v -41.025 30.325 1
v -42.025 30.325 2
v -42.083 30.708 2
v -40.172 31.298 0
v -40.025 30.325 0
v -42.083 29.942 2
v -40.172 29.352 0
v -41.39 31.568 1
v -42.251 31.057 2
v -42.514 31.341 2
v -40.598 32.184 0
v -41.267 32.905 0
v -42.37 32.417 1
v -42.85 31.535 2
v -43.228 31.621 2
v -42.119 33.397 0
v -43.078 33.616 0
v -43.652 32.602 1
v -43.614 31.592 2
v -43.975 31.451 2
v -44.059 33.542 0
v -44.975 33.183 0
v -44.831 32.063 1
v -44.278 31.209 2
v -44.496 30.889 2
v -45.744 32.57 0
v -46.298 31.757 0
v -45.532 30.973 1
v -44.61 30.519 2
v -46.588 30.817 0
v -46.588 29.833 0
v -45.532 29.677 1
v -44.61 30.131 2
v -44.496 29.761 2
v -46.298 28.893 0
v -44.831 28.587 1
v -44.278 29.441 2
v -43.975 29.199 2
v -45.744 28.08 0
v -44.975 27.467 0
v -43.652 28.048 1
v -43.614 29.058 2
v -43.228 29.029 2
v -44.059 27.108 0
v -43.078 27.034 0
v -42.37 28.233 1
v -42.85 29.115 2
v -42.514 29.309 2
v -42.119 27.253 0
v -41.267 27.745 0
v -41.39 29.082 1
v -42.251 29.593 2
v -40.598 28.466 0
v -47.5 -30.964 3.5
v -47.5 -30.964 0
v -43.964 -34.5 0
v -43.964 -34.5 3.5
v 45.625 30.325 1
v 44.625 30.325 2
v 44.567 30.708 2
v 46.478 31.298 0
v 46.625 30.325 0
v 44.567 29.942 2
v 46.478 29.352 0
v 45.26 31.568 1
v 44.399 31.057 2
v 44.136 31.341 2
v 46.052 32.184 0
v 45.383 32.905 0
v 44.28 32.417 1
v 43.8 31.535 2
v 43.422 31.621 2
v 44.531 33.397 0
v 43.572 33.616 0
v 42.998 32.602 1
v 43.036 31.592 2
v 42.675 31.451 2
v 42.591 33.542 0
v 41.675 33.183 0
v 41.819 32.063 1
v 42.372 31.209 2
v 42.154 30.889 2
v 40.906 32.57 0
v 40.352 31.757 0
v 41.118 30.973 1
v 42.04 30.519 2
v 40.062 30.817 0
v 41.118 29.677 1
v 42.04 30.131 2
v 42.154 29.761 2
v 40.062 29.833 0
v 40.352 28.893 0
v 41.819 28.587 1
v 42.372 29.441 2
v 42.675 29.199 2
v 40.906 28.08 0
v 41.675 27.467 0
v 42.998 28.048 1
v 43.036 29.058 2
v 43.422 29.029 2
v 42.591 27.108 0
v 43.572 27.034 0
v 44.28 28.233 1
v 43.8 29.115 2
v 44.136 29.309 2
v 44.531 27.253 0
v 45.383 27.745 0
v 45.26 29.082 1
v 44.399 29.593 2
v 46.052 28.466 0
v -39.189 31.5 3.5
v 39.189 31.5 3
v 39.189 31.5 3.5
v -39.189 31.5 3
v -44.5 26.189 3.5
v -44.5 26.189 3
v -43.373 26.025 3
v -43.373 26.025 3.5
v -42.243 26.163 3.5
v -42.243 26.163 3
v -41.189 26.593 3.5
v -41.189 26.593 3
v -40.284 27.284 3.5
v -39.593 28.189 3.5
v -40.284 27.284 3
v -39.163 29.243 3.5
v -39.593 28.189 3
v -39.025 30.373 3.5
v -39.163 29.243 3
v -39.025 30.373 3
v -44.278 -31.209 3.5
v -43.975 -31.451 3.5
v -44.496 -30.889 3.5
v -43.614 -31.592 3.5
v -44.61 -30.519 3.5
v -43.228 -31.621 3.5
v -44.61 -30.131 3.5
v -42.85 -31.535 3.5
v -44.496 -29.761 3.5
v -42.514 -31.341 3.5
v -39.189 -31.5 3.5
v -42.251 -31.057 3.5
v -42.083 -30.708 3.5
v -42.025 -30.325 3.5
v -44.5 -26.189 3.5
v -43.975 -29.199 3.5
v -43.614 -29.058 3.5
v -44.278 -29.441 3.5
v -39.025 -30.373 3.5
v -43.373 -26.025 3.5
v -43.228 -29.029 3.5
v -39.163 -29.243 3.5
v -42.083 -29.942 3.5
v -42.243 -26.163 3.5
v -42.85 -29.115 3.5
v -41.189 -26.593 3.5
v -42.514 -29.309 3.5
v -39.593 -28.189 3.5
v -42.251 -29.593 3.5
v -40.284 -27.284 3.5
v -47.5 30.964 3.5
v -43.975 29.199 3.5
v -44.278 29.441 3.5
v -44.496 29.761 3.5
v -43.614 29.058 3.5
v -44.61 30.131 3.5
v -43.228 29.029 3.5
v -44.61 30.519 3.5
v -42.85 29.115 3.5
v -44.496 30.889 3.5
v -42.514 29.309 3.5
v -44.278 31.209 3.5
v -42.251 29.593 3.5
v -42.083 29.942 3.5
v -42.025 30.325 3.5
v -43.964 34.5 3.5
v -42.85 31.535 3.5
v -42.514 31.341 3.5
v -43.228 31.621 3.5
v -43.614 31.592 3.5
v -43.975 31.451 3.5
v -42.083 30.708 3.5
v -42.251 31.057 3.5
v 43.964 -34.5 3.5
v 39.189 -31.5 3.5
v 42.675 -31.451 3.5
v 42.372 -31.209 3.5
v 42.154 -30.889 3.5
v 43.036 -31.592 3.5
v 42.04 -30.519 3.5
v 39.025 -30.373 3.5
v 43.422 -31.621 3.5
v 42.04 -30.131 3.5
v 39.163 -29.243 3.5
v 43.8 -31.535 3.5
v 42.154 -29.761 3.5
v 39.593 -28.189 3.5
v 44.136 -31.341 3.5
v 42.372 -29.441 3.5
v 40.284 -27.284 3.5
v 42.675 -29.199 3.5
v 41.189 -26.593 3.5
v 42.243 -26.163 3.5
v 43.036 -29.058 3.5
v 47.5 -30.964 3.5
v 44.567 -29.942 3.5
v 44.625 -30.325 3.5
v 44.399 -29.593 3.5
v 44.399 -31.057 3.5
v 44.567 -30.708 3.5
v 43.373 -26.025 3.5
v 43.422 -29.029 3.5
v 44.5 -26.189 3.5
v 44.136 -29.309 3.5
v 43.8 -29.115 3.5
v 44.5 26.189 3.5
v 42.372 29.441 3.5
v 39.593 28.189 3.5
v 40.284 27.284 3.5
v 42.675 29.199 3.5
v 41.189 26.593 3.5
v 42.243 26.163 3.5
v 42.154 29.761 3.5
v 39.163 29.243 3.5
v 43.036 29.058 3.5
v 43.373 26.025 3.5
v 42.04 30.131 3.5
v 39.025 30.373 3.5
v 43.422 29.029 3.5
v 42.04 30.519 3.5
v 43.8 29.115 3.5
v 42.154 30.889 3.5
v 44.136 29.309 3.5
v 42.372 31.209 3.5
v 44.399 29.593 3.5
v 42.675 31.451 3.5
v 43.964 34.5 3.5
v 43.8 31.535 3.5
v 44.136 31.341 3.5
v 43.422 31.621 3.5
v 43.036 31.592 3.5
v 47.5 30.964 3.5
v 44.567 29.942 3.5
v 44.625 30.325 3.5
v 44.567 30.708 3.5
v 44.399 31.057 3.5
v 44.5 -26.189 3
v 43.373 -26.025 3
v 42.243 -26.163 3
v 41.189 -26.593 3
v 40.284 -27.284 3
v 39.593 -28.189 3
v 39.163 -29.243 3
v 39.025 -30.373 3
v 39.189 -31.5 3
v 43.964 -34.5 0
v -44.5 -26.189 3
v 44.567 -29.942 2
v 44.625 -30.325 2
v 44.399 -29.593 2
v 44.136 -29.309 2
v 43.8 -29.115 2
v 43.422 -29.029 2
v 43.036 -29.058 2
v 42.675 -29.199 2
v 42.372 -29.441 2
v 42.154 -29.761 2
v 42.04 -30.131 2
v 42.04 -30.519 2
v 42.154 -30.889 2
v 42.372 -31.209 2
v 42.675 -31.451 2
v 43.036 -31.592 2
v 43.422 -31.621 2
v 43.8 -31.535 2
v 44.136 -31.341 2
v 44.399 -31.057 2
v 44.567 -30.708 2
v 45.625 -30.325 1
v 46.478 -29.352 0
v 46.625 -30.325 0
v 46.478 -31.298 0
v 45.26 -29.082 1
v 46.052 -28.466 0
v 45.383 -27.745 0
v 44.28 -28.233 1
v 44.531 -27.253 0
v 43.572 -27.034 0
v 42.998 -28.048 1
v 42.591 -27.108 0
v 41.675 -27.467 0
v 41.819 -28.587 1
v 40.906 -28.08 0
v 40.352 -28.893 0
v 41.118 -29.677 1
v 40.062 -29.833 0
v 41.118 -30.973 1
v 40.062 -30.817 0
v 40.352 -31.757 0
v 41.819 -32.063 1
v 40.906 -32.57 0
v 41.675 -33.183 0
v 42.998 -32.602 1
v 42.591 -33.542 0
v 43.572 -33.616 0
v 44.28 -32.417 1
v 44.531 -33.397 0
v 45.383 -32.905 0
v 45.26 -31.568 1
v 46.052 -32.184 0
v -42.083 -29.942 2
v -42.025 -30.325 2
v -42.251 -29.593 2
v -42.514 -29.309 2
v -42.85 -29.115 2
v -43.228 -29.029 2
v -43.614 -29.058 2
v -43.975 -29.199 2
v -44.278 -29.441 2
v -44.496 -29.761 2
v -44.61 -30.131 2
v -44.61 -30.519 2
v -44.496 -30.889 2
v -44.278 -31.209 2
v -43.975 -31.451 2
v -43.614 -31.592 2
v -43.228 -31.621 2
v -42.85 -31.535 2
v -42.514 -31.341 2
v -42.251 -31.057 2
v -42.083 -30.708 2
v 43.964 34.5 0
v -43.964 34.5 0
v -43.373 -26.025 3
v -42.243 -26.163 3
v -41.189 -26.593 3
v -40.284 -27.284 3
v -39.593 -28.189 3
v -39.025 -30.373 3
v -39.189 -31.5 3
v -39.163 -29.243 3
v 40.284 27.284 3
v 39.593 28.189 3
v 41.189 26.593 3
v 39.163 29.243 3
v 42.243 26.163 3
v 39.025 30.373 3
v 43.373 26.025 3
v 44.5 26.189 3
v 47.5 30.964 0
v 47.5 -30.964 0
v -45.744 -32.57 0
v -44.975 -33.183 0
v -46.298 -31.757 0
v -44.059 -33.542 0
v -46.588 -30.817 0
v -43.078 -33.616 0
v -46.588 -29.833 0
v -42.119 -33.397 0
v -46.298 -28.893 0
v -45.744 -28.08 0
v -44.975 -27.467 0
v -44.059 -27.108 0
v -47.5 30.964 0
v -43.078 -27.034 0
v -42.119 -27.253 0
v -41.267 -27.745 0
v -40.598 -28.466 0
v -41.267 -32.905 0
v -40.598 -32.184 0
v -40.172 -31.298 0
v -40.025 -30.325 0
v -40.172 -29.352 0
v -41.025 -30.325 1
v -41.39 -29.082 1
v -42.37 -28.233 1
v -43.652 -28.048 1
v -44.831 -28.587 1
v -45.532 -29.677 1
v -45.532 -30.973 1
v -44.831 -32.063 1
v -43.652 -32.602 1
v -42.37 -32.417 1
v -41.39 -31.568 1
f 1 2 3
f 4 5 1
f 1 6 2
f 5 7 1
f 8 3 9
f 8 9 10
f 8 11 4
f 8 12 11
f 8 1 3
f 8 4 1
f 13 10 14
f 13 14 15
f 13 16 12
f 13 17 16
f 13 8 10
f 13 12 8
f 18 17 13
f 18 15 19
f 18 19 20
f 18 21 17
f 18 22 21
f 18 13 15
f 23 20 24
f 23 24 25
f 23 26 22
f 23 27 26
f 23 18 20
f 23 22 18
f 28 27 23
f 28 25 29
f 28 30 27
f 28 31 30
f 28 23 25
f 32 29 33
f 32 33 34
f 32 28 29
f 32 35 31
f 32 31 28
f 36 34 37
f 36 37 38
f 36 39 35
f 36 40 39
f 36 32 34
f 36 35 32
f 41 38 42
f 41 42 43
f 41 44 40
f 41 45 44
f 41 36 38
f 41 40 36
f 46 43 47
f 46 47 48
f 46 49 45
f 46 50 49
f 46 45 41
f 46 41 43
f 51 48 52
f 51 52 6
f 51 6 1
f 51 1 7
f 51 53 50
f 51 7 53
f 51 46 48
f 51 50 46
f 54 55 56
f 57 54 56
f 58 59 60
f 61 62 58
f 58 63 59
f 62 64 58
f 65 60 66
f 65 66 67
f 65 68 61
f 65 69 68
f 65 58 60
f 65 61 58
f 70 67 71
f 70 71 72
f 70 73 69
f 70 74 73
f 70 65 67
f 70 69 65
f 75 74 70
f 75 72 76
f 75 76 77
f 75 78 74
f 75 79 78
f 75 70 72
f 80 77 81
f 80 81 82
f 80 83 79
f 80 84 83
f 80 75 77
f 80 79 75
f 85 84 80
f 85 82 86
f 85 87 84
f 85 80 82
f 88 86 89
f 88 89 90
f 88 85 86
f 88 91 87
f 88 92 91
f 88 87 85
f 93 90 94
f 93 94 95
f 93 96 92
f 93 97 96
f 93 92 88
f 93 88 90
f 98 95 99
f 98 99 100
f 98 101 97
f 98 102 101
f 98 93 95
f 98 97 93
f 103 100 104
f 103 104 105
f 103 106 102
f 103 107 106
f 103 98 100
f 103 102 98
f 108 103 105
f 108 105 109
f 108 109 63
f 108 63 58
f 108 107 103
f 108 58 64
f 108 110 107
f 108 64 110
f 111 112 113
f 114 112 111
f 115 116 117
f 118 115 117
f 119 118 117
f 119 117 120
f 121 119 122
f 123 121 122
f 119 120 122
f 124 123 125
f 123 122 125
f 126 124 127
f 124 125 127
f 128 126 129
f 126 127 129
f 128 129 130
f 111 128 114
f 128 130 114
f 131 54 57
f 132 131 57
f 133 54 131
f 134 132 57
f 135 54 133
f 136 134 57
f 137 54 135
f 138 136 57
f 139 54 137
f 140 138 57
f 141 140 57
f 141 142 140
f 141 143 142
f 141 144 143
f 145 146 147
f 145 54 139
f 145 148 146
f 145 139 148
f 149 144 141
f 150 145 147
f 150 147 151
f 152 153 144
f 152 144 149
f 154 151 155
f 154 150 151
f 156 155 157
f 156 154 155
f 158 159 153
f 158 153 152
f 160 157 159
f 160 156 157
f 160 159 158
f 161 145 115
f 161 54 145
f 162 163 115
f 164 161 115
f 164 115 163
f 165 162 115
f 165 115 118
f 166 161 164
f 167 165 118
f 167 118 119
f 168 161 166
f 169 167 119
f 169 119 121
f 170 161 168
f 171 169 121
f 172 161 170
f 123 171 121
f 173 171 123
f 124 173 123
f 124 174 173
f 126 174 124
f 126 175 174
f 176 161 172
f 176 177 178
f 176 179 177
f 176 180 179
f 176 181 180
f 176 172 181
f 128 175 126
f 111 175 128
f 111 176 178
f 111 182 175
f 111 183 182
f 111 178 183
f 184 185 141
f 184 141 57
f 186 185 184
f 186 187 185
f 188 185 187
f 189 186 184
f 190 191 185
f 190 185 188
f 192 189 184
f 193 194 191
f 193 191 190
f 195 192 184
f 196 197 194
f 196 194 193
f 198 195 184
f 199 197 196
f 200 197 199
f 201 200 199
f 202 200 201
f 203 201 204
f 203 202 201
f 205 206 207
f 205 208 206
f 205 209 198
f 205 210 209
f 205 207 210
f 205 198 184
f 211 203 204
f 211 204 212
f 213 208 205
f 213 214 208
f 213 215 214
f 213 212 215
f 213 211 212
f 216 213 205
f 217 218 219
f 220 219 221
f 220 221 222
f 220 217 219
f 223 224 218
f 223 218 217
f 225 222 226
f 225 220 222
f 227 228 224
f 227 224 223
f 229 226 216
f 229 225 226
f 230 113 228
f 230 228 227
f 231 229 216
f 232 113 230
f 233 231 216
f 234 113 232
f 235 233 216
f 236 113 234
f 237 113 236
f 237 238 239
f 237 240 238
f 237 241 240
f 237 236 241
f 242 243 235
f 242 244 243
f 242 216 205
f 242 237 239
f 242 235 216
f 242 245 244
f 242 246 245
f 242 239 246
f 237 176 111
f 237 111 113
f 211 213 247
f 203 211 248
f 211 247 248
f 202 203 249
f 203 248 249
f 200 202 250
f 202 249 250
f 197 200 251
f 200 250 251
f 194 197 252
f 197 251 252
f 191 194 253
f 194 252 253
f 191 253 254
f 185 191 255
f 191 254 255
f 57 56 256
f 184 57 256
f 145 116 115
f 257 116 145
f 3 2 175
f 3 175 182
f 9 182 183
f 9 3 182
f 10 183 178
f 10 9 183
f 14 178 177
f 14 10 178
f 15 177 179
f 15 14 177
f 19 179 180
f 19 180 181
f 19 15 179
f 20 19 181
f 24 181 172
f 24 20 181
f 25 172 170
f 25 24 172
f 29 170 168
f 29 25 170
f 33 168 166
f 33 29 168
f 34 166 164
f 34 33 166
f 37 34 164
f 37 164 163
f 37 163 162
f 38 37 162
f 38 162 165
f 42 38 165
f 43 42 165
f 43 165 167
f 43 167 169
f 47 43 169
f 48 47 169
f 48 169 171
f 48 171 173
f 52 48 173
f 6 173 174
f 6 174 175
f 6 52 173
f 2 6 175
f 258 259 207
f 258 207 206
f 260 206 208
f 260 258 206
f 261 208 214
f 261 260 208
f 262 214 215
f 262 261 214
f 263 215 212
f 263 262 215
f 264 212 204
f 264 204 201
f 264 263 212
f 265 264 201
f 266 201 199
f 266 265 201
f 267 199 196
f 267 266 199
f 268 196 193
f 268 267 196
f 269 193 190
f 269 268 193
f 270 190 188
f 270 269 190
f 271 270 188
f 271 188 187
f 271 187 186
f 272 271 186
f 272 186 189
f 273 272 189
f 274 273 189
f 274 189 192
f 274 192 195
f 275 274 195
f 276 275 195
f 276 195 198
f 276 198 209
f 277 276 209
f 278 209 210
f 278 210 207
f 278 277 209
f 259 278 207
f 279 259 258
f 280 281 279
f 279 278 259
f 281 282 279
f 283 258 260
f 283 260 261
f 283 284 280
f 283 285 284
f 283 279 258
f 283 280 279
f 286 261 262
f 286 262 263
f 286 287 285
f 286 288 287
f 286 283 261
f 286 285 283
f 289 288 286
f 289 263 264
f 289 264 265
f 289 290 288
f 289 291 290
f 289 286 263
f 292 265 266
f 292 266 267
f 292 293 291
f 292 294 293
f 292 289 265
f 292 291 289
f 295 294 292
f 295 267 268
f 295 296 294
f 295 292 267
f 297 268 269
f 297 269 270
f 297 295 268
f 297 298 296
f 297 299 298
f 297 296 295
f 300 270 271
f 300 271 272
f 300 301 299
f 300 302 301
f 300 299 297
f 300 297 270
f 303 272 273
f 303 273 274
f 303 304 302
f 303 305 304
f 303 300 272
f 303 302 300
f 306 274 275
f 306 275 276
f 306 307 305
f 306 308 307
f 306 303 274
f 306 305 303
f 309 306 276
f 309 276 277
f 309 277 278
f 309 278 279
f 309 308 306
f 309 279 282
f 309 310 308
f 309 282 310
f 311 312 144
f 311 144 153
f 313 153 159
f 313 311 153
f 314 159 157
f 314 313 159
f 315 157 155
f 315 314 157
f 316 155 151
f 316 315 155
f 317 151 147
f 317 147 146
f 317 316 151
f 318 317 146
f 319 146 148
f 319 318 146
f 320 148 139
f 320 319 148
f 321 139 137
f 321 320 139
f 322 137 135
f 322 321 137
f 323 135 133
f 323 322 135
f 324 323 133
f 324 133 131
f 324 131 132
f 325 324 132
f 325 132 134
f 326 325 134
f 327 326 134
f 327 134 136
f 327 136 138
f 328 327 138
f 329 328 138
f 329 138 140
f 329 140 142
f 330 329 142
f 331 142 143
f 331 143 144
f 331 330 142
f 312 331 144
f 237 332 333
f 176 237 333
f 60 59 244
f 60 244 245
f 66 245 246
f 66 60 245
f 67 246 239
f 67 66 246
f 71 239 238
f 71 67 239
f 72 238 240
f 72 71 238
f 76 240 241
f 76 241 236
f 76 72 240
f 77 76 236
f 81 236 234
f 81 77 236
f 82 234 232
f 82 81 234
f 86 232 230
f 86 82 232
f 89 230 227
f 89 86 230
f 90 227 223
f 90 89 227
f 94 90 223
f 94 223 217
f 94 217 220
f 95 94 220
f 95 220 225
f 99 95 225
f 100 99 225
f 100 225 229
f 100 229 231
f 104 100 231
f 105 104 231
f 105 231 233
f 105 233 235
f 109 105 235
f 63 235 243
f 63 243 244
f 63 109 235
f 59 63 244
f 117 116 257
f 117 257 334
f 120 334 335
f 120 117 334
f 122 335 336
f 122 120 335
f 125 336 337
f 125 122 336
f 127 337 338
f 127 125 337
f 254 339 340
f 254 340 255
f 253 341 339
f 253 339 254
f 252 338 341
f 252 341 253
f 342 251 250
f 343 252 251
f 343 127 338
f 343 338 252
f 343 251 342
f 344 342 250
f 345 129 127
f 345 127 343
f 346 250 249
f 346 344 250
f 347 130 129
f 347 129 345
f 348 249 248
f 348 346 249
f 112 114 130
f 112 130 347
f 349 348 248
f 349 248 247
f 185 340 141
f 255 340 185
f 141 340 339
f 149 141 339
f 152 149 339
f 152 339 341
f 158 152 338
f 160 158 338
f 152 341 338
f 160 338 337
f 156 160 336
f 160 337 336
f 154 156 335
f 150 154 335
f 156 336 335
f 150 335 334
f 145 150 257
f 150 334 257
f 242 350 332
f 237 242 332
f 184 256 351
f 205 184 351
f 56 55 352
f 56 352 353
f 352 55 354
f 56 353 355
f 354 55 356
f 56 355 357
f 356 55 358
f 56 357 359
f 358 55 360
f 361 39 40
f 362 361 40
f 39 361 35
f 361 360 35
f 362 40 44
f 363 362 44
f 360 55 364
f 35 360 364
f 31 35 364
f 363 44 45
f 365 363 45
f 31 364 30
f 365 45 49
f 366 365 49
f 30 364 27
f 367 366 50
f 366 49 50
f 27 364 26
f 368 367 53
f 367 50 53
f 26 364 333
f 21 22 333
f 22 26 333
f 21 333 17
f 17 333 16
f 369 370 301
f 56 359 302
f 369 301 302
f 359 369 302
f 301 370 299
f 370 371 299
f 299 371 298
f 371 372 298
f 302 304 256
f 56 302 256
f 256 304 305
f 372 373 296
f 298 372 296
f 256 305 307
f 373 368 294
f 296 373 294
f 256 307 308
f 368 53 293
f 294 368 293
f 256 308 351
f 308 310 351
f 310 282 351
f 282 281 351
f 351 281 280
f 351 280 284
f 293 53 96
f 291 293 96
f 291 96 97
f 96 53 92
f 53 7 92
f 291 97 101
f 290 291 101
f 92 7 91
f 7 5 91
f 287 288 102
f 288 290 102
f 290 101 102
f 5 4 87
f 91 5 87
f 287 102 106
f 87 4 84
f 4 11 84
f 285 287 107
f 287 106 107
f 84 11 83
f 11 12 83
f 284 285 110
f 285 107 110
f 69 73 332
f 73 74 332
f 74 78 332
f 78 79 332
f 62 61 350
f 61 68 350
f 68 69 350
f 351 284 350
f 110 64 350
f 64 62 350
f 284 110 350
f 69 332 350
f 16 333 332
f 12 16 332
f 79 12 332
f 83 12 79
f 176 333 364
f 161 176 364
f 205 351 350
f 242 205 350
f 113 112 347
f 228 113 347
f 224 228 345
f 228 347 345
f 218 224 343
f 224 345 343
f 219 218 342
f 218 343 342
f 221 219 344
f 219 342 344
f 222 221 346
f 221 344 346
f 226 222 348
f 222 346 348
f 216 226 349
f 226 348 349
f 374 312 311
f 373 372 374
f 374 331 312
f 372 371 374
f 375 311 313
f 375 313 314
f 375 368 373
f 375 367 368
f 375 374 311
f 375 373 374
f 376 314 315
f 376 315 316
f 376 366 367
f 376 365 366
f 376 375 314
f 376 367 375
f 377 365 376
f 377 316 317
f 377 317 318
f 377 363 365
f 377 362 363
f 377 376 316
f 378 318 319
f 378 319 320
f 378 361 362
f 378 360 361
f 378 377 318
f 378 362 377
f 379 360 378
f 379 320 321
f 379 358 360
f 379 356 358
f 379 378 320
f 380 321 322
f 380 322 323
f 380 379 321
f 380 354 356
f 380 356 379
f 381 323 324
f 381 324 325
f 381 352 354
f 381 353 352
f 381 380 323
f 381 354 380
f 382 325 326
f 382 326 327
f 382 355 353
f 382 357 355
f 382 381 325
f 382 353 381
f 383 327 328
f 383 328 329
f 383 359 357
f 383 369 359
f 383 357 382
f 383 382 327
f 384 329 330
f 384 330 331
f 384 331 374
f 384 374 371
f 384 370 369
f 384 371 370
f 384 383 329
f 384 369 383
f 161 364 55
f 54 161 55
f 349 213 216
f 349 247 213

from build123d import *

# Parameters (mm, degrees)
F0_R     = 1.3
F1_DEPTH = 3.5
F2_T     = -3
F3_SIZE  = 2


with BuildPart() as f1:
    # F0 (on Top) → F1 (new body)
    with BuildSketch(Plane.XY):
        Polygon((-39.15, 34.5), (-43.964466, 34.5), (-47.5, 30.964466), (-47.5, 26.15), (-39.15, 26.15), align=None)
        with Locations((-43.325, 30.325)):
            Circle(F0_R, mode=Mode.SUBTRACT)
        Polygon((-27.15, 34.5), (-39.15, 34.5), (-39.15, 26.15), (-47.5, 26.15), (-47.5, 0), (-47.5, -26.15), (-39.15, -26.15), (-39.15, -32.7), (-39.15, -34.5), (-27.15, -34.5), (27.15, -34.5), (39.15, -34.5), (39.15, -32.7), (39.15, -26.15), (47.5, -26.15), (47.5, 0), (47.5, 26.15), (39.15, 26.15), (39.15, 34.5), (27.15, 34.5), align=None)
        Polygon((43.964466, 34.5), (39.15, 34.5), (39.15, 26.15), (47.5, 26.15), (47.5, 30.964466), align=None)
        with Locations((43.325, 30.325)):
            Circle(F0_R, mode=Mode.SUBTRACT)
        Polygon((-39.15, -26.15), (-47.5, -26.15), (-47.5, -30.964466), (-43.964466, -34.5), (-39.15, -34.5), (-39.15, -32.7), align=None)
        with Locations((-43.325, -30.325)):
            Circle(F0_R, mode=Mode.SUBTRACT)
        Polygon((47.5, -30.964466), (47.5, -26.15), (39.15, -26.15), (39.15, -32.7), (39.15, -34.5), (43.964466, -34.5), align=None)
        with Locations((43.325, -30.325)):
            Circle(F0_R, mode=Mode.SUBTRACT)
    extrude(amount=F1_DEPTH)

    # F2
    f2_openings = [f1.faces().sort_by_distance(p)[0] for p in [
        (0, 0, 3.5),
    ]]
    offset(amount=F2_T, openings=f2_openings)

    # F3
    f3_edges = [f1.edges().sort_by_distance(p)[0] for p in [
        (42.025, 30.325, 0),
        (42.025, -30.325, 0),
        (-44.625, -30.325, 0),
        (-44.625, 30.325, 0),
    ]]
    chamfer(f3_edges, length=F3_SIZE)


solid = f1.part
